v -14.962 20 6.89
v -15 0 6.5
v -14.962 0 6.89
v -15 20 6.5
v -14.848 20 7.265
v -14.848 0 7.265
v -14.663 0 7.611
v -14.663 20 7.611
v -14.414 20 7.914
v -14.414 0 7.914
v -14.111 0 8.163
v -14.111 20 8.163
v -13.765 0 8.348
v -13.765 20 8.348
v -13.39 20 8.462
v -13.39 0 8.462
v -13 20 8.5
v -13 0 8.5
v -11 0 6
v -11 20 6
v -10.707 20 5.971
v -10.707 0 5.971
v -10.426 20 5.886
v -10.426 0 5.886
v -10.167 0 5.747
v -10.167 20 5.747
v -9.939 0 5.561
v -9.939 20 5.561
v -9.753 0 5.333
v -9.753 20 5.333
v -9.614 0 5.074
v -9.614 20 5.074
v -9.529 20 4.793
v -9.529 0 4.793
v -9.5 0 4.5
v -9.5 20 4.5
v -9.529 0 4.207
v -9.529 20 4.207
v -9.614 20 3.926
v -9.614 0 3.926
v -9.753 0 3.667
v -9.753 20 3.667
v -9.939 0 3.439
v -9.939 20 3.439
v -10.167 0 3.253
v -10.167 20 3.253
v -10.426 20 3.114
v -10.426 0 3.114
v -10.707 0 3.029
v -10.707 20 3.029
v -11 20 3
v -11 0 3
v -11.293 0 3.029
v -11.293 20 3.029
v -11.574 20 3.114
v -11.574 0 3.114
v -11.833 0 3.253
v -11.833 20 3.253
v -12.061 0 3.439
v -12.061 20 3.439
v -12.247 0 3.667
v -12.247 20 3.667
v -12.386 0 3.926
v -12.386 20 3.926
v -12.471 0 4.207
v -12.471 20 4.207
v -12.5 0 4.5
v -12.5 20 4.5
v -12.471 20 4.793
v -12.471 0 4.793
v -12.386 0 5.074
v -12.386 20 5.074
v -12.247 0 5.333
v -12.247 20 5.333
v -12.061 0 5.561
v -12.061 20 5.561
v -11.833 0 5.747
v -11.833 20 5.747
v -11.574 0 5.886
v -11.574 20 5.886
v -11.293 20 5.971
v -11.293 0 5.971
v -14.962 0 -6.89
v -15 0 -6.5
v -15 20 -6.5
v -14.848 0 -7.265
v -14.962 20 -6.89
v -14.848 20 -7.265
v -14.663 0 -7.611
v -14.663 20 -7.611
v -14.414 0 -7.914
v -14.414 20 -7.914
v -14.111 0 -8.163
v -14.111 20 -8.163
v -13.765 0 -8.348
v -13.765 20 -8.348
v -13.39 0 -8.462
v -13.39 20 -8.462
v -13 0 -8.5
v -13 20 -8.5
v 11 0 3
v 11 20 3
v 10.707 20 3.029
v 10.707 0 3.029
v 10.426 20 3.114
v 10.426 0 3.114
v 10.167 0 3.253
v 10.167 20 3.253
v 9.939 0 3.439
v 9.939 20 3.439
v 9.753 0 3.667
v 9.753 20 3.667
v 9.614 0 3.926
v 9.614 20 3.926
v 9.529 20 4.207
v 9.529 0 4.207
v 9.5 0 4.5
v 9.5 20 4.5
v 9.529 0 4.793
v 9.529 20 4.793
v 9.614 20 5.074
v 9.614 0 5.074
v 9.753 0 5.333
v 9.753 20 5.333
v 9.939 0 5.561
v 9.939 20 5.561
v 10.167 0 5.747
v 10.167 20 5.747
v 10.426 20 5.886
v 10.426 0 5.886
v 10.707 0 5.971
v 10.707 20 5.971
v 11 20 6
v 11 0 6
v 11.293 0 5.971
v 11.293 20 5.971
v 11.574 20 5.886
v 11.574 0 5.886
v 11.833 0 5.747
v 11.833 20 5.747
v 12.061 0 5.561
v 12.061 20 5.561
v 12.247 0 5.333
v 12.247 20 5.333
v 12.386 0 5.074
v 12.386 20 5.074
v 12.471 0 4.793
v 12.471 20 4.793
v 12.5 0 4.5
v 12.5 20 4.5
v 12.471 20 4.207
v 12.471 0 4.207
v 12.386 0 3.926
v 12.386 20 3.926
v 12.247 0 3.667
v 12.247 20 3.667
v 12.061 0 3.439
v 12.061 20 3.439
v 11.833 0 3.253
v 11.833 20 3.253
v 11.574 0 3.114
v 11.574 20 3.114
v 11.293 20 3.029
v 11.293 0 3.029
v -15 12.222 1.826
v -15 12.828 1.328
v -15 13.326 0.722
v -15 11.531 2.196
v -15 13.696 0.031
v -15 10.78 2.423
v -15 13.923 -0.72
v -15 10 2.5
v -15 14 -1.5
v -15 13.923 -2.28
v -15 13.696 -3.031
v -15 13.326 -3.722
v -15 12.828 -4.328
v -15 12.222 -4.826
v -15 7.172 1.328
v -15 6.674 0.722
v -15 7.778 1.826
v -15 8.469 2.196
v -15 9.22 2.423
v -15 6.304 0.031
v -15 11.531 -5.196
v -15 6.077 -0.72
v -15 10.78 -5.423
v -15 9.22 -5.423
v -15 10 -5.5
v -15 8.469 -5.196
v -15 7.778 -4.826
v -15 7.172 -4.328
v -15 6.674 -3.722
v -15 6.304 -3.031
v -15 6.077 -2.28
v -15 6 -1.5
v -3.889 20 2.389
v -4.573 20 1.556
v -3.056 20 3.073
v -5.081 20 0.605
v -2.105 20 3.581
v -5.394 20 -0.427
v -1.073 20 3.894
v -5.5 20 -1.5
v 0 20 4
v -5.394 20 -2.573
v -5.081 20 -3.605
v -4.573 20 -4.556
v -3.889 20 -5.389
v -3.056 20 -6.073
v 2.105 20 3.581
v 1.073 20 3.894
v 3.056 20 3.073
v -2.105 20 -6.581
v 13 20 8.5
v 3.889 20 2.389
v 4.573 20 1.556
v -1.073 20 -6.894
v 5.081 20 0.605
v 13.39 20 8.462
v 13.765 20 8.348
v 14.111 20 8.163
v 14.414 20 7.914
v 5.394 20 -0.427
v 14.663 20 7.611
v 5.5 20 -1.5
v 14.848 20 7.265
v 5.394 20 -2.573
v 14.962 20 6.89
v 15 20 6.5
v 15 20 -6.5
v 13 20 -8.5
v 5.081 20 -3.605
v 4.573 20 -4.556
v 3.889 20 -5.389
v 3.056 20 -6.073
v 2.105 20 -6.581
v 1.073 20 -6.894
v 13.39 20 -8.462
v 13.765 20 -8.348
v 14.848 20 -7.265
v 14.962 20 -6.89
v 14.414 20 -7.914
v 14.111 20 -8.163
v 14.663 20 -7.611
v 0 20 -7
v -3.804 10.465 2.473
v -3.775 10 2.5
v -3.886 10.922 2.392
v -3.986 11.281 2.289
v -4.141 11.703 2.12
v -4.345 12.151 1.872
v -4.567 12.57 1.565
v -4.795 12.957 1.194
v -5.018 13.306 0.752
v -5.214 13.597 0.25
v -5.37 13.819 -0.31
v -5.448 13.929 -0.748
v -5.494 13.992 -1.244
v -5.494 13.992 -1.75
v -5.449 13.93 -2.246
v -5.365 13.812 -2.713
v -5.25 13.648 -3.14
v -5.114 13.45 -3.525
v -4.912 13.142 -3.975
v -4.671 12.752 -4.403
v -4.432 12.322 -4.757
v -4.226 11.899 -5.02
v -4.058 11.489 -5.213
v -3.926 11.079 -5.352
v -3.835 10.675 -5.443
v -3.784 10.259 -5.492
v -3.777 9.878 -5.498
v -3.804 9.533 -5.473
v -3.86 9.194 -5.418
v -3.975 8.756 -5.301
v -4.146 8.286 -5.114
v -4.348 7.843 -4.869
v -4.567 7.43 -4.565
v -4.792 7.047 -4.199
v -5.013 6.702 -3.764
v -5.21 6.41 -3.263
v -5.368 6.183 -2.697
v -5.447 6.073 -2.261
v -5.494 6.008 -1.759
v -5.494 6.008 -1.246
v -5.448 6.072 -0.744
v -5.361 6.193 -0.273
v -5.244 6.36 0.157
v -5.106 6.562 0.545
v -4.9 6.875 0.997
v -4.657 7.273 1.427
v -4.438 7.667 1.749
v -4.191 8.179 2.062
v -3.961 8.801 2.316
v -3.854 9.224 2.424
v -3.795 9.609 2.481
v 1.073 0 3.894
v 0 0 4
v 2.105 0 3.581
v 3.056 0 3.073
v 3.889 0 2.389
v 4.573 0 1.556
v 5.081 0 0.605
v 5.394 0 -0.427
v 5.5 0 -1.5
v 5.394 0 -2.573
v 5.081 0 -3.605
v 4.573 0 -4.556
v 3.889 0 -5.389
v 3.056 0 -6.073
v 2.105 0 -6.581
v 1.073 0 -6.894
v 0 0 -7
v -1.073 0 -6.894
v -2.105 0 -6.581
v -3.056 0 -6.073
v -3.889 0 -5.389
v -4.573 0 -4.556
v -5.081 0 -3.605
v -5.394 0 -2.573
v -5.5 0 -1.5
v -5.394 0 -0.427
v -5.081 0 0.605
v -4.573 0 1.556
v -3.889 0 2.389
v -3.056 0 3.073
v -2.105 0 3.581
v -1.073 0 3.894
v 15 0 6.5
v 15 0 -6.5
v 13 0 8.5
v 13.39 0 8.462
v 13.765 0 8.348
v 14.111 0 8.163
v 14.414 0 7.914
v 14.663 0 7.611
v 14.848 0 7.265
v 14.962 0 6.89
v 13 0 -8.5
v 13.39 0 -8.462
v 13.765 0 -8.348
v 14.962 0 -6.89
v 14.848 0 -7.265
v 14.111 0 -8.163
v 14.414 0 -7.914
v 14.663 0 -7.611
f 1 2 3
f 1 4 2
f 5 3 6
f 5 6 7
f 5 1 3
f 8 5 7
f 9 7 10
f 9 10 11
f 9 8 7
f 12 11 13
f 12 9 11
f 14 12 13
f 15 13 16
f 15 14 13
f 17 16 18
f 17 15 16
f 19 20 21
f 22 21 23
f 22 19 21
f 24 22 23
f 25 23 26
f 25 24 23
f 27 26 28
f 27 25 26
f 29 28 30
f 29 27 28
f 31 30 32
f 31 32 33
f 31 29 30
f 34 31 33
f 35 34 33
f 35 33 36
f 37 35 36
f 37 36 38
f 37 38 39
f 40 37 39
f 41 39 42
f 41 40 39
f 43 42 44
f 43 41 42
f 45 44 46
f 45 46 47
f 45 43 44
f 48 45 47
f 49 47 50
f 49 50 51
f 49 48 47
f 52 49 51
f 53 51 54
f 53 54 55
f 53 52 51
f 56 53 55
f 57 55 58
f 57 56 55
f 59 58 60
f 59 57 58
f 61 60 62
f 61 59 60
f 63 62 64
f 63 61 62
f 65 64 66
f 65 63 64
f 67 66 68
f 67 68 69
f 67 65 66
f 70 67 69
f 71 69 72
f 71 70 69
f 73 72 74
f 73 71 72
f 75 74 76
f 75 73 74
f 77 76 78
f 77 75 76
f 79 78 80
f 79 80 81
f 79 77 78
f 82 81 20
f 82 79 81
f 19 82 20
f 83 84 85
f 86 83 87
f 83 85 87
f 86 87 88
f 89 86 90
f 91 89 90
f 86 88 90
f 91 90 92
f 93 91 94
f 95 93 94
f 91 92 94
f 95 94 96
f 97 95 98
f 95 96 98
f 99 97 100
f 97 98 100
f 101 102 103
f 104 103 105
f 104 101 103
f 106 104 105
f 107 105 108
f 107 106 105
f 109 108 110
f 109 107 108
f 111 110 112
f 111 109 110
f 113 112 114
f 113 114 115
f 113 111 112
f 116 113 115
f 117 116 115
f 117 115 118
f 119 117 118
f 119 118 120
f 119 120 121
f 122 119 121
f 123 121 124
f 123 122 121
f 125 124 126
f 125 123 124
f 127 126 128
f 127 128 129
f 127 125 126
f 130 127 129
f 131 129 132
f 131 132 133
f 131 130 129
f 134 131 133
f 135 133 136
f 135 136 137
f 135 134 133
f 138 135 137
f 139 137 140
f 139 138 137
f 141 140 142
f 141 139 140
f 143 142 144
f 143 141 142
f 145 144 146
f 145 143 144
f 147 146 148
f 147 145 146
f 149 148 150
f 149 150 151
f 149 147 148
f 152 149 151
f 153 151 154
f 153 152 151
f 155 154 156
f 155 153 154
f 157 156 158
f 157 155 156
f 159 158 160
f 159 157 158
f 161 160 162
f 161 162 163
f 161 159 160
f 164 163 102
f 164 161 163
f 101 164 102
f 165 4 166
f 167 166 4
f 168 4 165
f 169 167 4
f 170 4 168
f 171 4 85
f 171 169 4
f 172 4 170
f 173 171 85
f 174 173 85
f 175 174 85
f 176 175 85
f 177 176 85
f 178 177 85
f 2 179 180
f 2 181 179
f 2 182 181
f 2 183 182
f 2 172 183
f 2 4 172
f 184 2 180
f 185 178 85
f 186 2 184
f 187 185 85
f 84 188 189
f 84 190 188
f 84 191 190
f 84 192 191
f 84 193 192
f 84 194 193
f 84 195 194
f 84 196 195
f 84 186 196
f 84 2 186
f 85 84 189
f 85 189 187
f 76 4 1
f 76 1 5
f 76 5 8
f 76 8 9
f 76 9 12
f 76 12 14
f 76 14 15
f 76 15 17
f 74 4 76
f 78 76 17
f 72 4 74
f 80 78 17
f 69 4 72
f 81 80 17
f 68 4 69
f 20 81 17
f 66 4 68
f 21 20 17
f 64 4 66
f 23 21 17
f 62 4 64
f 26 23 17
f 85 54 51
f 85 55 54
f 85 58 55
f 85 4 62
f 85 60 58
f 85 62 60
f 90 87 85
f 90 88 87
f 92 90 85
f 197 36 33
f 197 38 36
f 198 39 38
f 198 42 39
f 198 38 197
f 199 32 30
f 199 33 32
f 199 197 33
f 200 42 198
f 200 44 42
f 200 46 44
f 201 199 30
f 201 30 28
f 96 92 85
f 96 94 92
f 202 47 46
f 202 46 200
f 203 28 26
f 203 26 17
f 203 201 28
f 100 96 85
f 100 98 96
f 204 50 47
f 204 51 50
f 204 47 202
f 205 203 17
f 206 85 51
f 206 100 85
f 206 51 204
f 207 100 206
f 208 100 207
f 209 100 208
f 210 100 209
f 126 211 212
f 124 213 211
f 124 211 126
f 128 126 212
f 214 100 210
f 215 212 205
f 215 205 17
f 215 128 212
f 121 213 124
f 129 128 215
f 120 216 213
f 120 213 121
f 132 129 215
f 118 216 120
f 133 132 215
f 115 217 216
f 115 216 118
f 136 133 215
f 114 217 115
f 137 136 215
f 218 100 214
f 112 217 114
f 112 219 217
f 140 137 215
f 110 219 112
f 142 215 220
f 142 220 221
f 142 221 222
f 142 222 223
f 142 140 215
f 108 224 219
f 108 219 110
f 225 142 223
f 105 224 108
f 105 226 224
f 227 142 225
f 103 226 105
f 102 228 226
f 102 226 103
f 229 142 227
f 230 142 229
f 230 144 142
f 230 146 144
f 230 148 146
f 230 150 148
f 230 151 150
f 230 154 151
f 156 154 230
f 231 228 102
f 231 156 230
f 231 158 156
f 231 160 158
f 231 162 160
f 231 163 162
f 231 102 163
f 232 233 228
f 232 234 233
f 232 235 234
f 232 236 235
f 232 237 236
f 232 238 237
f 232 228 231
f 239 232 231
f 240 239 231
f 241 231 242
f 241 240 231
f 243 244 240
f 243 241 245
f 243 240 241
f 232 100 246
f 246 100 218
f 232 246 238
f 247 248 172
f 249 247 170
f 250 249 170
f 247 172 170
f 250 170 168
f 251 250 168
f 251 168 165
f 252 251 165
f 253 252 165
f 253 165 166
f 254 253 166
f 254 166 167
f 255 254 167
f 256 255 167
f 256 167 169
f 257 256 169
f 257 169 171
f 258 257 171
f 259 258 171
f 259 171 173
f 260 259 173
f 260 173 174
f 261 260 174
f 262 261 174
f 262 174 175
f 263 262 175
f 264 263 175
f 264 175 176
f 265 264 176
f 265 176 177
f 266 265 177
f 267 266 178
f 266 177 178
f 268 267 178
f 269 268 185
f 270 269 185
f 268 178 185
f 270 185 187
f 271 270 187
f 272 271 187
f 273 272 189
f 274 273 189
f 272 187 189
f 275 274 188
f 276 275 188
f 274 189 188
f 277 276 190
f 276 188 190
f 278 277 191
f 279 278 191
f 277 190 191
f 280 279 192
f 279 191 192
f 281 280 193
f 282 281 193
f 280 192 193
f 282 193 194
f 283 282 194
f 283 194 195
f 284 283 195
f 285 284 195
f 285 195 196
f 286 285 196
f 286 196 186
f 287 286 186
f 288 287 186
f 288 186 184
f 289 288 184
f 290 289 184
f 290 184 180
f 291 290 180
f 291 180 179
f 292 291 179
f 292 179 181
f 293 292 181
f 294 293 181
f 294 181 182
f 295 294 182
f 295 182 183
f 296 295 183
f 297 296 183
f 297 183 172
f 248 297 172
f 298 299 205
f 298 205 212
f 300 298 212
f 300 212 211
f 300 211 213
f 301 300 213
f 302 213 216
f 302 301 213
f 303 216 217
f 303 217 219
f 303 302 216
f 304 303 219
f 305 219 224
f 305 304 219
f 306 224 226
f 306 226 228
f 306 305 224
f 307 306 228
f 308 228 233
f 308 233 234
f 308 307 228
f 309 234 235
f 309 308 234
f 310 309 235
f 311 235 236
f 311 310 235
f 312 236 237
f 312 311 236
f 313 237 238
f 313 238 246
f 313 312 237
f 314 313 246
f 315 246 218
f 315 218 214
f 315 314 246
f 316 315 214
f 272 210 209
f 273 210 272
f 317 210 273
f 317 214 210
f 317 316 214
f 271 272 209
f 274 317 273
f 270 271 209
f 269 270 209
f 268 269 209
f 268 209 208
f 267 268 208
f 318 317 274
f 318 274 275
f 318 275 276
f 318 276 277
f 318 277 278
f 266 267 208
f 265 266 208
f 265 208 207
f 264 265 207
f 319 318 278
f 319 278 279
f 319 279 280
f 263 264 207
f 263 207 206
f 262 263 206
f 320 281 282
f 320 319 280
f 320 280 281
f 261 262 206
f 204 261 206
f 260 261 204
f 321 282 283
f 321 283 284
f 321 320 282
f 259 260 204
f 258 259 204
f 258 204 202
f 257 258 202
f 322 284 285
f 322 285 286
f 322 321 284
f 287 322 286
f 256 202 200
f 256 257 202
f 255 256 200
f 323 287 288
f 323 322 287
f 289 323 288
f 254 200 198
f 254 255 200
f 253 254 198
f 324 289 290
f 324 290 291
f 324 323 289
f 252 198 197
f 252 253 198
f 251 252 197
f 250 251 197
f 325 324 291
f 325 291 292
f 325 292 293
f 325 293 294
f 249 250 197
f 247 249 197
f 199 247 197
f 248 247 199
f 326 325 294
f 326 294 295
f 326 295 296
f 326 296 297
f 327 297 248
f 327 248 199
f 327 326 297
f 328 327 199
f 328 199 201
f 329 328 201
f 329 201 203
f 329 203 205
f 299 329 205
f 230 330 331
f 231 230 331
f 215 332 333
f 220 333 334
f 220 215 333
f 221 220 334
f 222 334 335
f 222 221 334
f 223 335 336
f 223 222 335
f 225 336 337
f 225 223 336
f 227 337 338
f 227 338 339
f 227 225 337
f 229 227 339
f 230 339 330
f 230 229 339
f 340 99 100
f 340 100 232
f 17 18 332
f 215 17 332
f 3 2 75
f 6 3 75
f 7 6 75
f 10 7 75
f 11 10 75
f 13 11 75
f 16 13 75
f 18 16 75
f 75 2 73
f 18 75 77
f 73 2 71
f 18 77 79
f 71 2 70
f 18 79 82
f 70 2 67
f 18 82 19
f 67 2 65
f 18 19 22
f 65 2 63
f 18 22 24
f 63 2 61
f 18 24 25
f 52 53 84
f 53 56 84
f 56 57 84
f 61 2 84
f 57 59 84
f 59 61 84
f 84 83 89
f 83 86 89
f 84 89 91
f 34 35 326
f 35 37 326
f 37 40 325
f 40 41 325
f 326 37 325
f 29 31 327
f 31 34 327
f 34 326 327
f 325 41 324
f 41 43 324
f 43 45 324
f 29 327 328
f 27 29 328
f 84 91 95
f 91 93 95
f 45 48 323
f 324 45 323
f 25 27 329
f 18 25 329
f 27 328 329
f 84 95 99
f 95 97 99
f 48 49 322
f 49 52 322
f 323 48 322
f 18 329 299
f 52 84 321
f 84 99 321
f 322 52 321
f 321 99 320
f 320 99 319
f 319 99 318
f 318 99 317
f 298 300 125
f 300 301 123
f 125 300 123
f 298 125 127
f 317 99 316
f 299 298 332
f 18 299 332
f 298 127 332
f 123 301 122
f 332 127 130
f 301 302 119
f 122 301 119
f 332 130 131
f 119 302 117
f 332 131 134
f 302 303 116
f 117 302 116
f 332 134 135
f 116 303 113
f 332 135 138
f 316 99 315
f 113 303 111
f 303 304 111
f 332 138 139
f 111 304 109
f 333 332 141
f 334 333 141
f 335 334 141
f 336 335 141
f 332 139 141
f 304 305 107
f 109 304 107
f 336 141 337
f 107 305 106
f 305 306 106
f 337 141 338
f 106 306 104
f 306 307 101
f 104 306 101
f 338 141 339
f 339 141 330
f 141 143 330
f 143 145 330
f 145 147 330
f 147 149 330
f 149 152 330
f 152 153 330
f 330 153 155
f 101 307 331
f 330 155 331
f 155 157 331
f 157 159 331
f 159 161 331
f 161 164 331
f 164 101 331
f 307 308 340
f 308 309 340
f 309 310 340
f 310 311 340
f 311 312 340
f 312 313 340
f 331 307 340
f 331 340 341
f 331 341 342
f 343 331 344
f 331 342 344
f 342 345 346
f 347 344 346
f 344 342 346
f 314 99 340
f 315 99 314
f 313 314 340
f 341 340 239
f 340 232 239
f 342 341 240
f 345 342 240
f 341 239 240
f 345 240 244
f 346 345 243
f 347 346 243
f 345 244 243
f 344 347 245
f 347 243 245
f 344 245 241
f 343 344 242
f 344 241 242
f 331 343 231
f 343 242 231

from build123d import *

# Parameters (mm, degrees)
SKETCH_1_W               = 30
SKETCH_1_H               = 17
SKETCH_1_R               = 1.5
SKETCH_1_R_2             = 5.5
EXTRUDE_1_DEPTH          = 20
CUT_EXTRUDE_1_REACH      = 39.044
CUT_EXTRUDE_1_END_RADIUS = 5.5
SKETCH_2_R               = 4
FILLET_1_R               = 2


with BuildPart() as part:
    # 草图1 → 凸台-拉伸1 (new body)
    with BuildSketch(Plane(origin=(0, 0, 0), x_dir=(1, 0, 0), z_dir=(0, 1, 0))):
        Rectangle(SKETCH_1_W, SKETCH_1_H)
        with Locations(Location((-11, -4.5, 0), (0, 0, 270))):
            Circle(SKETCH_1_R, mode=Mode.SUBTRACT)
        with Locations(Location((11, -4.5, 0), (0, 0, 90))):
            Circle(SKETCH_1_R, mode=Mode.SUBTRACT)
        with Locations(Location((0, 1.5, 0), (0, 0, 270))):
            Circle(SKETCH_1_R_2, mode=Mode.SUBTRACT)
    extrude(amount=EXTRUDE_1_DEPTH)

    # 切除-拉伸1: up to this cylinder (the profile starts outside it)
    cut_extrude_1_end = Plane(origin=(0, 10, -1.5), z_dir=(0, -1, 0)) * Cylinder(CUT_EXTRUDE_1_END_RADIUS, 90.088, mode=Mode.PRIVATE)
    # 草图2 → 切除-拉伸1 (cut, up to the surface)
    with BuildSketch(Plane.ZY.offset(15), mode=Mode.PRIVATE) as cut_extrude_1_sk1:
        with Locations((-1.5, 10)):
            Circle(SKETCH_2_R)
    cut_extrude_1_tool1 = extrude(cut_extrude_1_sk1.sketch, amount=-CUT_EXTRUDE_1_REACH, mode=Mode.PRIVATE) - cut_extrude_1_end
    add(cut_extrude_1_tool1.solids().sort_by_distance((-15, 10, -1.5))[0], mode=Mode.SUBTRACT)

    # 圆角1
    fillet_1_edges = [part.edges().sort_by_distance(p)[0] for p in [
        (15, 10, 8.5),
        (-15, 10, 8.5),
        (-15, 10, -8.5),
        (15, 10, -8.5),
    ]]
    fillet(fillet_1_edges, radius=FILLET_1_R)


solid = part.part
